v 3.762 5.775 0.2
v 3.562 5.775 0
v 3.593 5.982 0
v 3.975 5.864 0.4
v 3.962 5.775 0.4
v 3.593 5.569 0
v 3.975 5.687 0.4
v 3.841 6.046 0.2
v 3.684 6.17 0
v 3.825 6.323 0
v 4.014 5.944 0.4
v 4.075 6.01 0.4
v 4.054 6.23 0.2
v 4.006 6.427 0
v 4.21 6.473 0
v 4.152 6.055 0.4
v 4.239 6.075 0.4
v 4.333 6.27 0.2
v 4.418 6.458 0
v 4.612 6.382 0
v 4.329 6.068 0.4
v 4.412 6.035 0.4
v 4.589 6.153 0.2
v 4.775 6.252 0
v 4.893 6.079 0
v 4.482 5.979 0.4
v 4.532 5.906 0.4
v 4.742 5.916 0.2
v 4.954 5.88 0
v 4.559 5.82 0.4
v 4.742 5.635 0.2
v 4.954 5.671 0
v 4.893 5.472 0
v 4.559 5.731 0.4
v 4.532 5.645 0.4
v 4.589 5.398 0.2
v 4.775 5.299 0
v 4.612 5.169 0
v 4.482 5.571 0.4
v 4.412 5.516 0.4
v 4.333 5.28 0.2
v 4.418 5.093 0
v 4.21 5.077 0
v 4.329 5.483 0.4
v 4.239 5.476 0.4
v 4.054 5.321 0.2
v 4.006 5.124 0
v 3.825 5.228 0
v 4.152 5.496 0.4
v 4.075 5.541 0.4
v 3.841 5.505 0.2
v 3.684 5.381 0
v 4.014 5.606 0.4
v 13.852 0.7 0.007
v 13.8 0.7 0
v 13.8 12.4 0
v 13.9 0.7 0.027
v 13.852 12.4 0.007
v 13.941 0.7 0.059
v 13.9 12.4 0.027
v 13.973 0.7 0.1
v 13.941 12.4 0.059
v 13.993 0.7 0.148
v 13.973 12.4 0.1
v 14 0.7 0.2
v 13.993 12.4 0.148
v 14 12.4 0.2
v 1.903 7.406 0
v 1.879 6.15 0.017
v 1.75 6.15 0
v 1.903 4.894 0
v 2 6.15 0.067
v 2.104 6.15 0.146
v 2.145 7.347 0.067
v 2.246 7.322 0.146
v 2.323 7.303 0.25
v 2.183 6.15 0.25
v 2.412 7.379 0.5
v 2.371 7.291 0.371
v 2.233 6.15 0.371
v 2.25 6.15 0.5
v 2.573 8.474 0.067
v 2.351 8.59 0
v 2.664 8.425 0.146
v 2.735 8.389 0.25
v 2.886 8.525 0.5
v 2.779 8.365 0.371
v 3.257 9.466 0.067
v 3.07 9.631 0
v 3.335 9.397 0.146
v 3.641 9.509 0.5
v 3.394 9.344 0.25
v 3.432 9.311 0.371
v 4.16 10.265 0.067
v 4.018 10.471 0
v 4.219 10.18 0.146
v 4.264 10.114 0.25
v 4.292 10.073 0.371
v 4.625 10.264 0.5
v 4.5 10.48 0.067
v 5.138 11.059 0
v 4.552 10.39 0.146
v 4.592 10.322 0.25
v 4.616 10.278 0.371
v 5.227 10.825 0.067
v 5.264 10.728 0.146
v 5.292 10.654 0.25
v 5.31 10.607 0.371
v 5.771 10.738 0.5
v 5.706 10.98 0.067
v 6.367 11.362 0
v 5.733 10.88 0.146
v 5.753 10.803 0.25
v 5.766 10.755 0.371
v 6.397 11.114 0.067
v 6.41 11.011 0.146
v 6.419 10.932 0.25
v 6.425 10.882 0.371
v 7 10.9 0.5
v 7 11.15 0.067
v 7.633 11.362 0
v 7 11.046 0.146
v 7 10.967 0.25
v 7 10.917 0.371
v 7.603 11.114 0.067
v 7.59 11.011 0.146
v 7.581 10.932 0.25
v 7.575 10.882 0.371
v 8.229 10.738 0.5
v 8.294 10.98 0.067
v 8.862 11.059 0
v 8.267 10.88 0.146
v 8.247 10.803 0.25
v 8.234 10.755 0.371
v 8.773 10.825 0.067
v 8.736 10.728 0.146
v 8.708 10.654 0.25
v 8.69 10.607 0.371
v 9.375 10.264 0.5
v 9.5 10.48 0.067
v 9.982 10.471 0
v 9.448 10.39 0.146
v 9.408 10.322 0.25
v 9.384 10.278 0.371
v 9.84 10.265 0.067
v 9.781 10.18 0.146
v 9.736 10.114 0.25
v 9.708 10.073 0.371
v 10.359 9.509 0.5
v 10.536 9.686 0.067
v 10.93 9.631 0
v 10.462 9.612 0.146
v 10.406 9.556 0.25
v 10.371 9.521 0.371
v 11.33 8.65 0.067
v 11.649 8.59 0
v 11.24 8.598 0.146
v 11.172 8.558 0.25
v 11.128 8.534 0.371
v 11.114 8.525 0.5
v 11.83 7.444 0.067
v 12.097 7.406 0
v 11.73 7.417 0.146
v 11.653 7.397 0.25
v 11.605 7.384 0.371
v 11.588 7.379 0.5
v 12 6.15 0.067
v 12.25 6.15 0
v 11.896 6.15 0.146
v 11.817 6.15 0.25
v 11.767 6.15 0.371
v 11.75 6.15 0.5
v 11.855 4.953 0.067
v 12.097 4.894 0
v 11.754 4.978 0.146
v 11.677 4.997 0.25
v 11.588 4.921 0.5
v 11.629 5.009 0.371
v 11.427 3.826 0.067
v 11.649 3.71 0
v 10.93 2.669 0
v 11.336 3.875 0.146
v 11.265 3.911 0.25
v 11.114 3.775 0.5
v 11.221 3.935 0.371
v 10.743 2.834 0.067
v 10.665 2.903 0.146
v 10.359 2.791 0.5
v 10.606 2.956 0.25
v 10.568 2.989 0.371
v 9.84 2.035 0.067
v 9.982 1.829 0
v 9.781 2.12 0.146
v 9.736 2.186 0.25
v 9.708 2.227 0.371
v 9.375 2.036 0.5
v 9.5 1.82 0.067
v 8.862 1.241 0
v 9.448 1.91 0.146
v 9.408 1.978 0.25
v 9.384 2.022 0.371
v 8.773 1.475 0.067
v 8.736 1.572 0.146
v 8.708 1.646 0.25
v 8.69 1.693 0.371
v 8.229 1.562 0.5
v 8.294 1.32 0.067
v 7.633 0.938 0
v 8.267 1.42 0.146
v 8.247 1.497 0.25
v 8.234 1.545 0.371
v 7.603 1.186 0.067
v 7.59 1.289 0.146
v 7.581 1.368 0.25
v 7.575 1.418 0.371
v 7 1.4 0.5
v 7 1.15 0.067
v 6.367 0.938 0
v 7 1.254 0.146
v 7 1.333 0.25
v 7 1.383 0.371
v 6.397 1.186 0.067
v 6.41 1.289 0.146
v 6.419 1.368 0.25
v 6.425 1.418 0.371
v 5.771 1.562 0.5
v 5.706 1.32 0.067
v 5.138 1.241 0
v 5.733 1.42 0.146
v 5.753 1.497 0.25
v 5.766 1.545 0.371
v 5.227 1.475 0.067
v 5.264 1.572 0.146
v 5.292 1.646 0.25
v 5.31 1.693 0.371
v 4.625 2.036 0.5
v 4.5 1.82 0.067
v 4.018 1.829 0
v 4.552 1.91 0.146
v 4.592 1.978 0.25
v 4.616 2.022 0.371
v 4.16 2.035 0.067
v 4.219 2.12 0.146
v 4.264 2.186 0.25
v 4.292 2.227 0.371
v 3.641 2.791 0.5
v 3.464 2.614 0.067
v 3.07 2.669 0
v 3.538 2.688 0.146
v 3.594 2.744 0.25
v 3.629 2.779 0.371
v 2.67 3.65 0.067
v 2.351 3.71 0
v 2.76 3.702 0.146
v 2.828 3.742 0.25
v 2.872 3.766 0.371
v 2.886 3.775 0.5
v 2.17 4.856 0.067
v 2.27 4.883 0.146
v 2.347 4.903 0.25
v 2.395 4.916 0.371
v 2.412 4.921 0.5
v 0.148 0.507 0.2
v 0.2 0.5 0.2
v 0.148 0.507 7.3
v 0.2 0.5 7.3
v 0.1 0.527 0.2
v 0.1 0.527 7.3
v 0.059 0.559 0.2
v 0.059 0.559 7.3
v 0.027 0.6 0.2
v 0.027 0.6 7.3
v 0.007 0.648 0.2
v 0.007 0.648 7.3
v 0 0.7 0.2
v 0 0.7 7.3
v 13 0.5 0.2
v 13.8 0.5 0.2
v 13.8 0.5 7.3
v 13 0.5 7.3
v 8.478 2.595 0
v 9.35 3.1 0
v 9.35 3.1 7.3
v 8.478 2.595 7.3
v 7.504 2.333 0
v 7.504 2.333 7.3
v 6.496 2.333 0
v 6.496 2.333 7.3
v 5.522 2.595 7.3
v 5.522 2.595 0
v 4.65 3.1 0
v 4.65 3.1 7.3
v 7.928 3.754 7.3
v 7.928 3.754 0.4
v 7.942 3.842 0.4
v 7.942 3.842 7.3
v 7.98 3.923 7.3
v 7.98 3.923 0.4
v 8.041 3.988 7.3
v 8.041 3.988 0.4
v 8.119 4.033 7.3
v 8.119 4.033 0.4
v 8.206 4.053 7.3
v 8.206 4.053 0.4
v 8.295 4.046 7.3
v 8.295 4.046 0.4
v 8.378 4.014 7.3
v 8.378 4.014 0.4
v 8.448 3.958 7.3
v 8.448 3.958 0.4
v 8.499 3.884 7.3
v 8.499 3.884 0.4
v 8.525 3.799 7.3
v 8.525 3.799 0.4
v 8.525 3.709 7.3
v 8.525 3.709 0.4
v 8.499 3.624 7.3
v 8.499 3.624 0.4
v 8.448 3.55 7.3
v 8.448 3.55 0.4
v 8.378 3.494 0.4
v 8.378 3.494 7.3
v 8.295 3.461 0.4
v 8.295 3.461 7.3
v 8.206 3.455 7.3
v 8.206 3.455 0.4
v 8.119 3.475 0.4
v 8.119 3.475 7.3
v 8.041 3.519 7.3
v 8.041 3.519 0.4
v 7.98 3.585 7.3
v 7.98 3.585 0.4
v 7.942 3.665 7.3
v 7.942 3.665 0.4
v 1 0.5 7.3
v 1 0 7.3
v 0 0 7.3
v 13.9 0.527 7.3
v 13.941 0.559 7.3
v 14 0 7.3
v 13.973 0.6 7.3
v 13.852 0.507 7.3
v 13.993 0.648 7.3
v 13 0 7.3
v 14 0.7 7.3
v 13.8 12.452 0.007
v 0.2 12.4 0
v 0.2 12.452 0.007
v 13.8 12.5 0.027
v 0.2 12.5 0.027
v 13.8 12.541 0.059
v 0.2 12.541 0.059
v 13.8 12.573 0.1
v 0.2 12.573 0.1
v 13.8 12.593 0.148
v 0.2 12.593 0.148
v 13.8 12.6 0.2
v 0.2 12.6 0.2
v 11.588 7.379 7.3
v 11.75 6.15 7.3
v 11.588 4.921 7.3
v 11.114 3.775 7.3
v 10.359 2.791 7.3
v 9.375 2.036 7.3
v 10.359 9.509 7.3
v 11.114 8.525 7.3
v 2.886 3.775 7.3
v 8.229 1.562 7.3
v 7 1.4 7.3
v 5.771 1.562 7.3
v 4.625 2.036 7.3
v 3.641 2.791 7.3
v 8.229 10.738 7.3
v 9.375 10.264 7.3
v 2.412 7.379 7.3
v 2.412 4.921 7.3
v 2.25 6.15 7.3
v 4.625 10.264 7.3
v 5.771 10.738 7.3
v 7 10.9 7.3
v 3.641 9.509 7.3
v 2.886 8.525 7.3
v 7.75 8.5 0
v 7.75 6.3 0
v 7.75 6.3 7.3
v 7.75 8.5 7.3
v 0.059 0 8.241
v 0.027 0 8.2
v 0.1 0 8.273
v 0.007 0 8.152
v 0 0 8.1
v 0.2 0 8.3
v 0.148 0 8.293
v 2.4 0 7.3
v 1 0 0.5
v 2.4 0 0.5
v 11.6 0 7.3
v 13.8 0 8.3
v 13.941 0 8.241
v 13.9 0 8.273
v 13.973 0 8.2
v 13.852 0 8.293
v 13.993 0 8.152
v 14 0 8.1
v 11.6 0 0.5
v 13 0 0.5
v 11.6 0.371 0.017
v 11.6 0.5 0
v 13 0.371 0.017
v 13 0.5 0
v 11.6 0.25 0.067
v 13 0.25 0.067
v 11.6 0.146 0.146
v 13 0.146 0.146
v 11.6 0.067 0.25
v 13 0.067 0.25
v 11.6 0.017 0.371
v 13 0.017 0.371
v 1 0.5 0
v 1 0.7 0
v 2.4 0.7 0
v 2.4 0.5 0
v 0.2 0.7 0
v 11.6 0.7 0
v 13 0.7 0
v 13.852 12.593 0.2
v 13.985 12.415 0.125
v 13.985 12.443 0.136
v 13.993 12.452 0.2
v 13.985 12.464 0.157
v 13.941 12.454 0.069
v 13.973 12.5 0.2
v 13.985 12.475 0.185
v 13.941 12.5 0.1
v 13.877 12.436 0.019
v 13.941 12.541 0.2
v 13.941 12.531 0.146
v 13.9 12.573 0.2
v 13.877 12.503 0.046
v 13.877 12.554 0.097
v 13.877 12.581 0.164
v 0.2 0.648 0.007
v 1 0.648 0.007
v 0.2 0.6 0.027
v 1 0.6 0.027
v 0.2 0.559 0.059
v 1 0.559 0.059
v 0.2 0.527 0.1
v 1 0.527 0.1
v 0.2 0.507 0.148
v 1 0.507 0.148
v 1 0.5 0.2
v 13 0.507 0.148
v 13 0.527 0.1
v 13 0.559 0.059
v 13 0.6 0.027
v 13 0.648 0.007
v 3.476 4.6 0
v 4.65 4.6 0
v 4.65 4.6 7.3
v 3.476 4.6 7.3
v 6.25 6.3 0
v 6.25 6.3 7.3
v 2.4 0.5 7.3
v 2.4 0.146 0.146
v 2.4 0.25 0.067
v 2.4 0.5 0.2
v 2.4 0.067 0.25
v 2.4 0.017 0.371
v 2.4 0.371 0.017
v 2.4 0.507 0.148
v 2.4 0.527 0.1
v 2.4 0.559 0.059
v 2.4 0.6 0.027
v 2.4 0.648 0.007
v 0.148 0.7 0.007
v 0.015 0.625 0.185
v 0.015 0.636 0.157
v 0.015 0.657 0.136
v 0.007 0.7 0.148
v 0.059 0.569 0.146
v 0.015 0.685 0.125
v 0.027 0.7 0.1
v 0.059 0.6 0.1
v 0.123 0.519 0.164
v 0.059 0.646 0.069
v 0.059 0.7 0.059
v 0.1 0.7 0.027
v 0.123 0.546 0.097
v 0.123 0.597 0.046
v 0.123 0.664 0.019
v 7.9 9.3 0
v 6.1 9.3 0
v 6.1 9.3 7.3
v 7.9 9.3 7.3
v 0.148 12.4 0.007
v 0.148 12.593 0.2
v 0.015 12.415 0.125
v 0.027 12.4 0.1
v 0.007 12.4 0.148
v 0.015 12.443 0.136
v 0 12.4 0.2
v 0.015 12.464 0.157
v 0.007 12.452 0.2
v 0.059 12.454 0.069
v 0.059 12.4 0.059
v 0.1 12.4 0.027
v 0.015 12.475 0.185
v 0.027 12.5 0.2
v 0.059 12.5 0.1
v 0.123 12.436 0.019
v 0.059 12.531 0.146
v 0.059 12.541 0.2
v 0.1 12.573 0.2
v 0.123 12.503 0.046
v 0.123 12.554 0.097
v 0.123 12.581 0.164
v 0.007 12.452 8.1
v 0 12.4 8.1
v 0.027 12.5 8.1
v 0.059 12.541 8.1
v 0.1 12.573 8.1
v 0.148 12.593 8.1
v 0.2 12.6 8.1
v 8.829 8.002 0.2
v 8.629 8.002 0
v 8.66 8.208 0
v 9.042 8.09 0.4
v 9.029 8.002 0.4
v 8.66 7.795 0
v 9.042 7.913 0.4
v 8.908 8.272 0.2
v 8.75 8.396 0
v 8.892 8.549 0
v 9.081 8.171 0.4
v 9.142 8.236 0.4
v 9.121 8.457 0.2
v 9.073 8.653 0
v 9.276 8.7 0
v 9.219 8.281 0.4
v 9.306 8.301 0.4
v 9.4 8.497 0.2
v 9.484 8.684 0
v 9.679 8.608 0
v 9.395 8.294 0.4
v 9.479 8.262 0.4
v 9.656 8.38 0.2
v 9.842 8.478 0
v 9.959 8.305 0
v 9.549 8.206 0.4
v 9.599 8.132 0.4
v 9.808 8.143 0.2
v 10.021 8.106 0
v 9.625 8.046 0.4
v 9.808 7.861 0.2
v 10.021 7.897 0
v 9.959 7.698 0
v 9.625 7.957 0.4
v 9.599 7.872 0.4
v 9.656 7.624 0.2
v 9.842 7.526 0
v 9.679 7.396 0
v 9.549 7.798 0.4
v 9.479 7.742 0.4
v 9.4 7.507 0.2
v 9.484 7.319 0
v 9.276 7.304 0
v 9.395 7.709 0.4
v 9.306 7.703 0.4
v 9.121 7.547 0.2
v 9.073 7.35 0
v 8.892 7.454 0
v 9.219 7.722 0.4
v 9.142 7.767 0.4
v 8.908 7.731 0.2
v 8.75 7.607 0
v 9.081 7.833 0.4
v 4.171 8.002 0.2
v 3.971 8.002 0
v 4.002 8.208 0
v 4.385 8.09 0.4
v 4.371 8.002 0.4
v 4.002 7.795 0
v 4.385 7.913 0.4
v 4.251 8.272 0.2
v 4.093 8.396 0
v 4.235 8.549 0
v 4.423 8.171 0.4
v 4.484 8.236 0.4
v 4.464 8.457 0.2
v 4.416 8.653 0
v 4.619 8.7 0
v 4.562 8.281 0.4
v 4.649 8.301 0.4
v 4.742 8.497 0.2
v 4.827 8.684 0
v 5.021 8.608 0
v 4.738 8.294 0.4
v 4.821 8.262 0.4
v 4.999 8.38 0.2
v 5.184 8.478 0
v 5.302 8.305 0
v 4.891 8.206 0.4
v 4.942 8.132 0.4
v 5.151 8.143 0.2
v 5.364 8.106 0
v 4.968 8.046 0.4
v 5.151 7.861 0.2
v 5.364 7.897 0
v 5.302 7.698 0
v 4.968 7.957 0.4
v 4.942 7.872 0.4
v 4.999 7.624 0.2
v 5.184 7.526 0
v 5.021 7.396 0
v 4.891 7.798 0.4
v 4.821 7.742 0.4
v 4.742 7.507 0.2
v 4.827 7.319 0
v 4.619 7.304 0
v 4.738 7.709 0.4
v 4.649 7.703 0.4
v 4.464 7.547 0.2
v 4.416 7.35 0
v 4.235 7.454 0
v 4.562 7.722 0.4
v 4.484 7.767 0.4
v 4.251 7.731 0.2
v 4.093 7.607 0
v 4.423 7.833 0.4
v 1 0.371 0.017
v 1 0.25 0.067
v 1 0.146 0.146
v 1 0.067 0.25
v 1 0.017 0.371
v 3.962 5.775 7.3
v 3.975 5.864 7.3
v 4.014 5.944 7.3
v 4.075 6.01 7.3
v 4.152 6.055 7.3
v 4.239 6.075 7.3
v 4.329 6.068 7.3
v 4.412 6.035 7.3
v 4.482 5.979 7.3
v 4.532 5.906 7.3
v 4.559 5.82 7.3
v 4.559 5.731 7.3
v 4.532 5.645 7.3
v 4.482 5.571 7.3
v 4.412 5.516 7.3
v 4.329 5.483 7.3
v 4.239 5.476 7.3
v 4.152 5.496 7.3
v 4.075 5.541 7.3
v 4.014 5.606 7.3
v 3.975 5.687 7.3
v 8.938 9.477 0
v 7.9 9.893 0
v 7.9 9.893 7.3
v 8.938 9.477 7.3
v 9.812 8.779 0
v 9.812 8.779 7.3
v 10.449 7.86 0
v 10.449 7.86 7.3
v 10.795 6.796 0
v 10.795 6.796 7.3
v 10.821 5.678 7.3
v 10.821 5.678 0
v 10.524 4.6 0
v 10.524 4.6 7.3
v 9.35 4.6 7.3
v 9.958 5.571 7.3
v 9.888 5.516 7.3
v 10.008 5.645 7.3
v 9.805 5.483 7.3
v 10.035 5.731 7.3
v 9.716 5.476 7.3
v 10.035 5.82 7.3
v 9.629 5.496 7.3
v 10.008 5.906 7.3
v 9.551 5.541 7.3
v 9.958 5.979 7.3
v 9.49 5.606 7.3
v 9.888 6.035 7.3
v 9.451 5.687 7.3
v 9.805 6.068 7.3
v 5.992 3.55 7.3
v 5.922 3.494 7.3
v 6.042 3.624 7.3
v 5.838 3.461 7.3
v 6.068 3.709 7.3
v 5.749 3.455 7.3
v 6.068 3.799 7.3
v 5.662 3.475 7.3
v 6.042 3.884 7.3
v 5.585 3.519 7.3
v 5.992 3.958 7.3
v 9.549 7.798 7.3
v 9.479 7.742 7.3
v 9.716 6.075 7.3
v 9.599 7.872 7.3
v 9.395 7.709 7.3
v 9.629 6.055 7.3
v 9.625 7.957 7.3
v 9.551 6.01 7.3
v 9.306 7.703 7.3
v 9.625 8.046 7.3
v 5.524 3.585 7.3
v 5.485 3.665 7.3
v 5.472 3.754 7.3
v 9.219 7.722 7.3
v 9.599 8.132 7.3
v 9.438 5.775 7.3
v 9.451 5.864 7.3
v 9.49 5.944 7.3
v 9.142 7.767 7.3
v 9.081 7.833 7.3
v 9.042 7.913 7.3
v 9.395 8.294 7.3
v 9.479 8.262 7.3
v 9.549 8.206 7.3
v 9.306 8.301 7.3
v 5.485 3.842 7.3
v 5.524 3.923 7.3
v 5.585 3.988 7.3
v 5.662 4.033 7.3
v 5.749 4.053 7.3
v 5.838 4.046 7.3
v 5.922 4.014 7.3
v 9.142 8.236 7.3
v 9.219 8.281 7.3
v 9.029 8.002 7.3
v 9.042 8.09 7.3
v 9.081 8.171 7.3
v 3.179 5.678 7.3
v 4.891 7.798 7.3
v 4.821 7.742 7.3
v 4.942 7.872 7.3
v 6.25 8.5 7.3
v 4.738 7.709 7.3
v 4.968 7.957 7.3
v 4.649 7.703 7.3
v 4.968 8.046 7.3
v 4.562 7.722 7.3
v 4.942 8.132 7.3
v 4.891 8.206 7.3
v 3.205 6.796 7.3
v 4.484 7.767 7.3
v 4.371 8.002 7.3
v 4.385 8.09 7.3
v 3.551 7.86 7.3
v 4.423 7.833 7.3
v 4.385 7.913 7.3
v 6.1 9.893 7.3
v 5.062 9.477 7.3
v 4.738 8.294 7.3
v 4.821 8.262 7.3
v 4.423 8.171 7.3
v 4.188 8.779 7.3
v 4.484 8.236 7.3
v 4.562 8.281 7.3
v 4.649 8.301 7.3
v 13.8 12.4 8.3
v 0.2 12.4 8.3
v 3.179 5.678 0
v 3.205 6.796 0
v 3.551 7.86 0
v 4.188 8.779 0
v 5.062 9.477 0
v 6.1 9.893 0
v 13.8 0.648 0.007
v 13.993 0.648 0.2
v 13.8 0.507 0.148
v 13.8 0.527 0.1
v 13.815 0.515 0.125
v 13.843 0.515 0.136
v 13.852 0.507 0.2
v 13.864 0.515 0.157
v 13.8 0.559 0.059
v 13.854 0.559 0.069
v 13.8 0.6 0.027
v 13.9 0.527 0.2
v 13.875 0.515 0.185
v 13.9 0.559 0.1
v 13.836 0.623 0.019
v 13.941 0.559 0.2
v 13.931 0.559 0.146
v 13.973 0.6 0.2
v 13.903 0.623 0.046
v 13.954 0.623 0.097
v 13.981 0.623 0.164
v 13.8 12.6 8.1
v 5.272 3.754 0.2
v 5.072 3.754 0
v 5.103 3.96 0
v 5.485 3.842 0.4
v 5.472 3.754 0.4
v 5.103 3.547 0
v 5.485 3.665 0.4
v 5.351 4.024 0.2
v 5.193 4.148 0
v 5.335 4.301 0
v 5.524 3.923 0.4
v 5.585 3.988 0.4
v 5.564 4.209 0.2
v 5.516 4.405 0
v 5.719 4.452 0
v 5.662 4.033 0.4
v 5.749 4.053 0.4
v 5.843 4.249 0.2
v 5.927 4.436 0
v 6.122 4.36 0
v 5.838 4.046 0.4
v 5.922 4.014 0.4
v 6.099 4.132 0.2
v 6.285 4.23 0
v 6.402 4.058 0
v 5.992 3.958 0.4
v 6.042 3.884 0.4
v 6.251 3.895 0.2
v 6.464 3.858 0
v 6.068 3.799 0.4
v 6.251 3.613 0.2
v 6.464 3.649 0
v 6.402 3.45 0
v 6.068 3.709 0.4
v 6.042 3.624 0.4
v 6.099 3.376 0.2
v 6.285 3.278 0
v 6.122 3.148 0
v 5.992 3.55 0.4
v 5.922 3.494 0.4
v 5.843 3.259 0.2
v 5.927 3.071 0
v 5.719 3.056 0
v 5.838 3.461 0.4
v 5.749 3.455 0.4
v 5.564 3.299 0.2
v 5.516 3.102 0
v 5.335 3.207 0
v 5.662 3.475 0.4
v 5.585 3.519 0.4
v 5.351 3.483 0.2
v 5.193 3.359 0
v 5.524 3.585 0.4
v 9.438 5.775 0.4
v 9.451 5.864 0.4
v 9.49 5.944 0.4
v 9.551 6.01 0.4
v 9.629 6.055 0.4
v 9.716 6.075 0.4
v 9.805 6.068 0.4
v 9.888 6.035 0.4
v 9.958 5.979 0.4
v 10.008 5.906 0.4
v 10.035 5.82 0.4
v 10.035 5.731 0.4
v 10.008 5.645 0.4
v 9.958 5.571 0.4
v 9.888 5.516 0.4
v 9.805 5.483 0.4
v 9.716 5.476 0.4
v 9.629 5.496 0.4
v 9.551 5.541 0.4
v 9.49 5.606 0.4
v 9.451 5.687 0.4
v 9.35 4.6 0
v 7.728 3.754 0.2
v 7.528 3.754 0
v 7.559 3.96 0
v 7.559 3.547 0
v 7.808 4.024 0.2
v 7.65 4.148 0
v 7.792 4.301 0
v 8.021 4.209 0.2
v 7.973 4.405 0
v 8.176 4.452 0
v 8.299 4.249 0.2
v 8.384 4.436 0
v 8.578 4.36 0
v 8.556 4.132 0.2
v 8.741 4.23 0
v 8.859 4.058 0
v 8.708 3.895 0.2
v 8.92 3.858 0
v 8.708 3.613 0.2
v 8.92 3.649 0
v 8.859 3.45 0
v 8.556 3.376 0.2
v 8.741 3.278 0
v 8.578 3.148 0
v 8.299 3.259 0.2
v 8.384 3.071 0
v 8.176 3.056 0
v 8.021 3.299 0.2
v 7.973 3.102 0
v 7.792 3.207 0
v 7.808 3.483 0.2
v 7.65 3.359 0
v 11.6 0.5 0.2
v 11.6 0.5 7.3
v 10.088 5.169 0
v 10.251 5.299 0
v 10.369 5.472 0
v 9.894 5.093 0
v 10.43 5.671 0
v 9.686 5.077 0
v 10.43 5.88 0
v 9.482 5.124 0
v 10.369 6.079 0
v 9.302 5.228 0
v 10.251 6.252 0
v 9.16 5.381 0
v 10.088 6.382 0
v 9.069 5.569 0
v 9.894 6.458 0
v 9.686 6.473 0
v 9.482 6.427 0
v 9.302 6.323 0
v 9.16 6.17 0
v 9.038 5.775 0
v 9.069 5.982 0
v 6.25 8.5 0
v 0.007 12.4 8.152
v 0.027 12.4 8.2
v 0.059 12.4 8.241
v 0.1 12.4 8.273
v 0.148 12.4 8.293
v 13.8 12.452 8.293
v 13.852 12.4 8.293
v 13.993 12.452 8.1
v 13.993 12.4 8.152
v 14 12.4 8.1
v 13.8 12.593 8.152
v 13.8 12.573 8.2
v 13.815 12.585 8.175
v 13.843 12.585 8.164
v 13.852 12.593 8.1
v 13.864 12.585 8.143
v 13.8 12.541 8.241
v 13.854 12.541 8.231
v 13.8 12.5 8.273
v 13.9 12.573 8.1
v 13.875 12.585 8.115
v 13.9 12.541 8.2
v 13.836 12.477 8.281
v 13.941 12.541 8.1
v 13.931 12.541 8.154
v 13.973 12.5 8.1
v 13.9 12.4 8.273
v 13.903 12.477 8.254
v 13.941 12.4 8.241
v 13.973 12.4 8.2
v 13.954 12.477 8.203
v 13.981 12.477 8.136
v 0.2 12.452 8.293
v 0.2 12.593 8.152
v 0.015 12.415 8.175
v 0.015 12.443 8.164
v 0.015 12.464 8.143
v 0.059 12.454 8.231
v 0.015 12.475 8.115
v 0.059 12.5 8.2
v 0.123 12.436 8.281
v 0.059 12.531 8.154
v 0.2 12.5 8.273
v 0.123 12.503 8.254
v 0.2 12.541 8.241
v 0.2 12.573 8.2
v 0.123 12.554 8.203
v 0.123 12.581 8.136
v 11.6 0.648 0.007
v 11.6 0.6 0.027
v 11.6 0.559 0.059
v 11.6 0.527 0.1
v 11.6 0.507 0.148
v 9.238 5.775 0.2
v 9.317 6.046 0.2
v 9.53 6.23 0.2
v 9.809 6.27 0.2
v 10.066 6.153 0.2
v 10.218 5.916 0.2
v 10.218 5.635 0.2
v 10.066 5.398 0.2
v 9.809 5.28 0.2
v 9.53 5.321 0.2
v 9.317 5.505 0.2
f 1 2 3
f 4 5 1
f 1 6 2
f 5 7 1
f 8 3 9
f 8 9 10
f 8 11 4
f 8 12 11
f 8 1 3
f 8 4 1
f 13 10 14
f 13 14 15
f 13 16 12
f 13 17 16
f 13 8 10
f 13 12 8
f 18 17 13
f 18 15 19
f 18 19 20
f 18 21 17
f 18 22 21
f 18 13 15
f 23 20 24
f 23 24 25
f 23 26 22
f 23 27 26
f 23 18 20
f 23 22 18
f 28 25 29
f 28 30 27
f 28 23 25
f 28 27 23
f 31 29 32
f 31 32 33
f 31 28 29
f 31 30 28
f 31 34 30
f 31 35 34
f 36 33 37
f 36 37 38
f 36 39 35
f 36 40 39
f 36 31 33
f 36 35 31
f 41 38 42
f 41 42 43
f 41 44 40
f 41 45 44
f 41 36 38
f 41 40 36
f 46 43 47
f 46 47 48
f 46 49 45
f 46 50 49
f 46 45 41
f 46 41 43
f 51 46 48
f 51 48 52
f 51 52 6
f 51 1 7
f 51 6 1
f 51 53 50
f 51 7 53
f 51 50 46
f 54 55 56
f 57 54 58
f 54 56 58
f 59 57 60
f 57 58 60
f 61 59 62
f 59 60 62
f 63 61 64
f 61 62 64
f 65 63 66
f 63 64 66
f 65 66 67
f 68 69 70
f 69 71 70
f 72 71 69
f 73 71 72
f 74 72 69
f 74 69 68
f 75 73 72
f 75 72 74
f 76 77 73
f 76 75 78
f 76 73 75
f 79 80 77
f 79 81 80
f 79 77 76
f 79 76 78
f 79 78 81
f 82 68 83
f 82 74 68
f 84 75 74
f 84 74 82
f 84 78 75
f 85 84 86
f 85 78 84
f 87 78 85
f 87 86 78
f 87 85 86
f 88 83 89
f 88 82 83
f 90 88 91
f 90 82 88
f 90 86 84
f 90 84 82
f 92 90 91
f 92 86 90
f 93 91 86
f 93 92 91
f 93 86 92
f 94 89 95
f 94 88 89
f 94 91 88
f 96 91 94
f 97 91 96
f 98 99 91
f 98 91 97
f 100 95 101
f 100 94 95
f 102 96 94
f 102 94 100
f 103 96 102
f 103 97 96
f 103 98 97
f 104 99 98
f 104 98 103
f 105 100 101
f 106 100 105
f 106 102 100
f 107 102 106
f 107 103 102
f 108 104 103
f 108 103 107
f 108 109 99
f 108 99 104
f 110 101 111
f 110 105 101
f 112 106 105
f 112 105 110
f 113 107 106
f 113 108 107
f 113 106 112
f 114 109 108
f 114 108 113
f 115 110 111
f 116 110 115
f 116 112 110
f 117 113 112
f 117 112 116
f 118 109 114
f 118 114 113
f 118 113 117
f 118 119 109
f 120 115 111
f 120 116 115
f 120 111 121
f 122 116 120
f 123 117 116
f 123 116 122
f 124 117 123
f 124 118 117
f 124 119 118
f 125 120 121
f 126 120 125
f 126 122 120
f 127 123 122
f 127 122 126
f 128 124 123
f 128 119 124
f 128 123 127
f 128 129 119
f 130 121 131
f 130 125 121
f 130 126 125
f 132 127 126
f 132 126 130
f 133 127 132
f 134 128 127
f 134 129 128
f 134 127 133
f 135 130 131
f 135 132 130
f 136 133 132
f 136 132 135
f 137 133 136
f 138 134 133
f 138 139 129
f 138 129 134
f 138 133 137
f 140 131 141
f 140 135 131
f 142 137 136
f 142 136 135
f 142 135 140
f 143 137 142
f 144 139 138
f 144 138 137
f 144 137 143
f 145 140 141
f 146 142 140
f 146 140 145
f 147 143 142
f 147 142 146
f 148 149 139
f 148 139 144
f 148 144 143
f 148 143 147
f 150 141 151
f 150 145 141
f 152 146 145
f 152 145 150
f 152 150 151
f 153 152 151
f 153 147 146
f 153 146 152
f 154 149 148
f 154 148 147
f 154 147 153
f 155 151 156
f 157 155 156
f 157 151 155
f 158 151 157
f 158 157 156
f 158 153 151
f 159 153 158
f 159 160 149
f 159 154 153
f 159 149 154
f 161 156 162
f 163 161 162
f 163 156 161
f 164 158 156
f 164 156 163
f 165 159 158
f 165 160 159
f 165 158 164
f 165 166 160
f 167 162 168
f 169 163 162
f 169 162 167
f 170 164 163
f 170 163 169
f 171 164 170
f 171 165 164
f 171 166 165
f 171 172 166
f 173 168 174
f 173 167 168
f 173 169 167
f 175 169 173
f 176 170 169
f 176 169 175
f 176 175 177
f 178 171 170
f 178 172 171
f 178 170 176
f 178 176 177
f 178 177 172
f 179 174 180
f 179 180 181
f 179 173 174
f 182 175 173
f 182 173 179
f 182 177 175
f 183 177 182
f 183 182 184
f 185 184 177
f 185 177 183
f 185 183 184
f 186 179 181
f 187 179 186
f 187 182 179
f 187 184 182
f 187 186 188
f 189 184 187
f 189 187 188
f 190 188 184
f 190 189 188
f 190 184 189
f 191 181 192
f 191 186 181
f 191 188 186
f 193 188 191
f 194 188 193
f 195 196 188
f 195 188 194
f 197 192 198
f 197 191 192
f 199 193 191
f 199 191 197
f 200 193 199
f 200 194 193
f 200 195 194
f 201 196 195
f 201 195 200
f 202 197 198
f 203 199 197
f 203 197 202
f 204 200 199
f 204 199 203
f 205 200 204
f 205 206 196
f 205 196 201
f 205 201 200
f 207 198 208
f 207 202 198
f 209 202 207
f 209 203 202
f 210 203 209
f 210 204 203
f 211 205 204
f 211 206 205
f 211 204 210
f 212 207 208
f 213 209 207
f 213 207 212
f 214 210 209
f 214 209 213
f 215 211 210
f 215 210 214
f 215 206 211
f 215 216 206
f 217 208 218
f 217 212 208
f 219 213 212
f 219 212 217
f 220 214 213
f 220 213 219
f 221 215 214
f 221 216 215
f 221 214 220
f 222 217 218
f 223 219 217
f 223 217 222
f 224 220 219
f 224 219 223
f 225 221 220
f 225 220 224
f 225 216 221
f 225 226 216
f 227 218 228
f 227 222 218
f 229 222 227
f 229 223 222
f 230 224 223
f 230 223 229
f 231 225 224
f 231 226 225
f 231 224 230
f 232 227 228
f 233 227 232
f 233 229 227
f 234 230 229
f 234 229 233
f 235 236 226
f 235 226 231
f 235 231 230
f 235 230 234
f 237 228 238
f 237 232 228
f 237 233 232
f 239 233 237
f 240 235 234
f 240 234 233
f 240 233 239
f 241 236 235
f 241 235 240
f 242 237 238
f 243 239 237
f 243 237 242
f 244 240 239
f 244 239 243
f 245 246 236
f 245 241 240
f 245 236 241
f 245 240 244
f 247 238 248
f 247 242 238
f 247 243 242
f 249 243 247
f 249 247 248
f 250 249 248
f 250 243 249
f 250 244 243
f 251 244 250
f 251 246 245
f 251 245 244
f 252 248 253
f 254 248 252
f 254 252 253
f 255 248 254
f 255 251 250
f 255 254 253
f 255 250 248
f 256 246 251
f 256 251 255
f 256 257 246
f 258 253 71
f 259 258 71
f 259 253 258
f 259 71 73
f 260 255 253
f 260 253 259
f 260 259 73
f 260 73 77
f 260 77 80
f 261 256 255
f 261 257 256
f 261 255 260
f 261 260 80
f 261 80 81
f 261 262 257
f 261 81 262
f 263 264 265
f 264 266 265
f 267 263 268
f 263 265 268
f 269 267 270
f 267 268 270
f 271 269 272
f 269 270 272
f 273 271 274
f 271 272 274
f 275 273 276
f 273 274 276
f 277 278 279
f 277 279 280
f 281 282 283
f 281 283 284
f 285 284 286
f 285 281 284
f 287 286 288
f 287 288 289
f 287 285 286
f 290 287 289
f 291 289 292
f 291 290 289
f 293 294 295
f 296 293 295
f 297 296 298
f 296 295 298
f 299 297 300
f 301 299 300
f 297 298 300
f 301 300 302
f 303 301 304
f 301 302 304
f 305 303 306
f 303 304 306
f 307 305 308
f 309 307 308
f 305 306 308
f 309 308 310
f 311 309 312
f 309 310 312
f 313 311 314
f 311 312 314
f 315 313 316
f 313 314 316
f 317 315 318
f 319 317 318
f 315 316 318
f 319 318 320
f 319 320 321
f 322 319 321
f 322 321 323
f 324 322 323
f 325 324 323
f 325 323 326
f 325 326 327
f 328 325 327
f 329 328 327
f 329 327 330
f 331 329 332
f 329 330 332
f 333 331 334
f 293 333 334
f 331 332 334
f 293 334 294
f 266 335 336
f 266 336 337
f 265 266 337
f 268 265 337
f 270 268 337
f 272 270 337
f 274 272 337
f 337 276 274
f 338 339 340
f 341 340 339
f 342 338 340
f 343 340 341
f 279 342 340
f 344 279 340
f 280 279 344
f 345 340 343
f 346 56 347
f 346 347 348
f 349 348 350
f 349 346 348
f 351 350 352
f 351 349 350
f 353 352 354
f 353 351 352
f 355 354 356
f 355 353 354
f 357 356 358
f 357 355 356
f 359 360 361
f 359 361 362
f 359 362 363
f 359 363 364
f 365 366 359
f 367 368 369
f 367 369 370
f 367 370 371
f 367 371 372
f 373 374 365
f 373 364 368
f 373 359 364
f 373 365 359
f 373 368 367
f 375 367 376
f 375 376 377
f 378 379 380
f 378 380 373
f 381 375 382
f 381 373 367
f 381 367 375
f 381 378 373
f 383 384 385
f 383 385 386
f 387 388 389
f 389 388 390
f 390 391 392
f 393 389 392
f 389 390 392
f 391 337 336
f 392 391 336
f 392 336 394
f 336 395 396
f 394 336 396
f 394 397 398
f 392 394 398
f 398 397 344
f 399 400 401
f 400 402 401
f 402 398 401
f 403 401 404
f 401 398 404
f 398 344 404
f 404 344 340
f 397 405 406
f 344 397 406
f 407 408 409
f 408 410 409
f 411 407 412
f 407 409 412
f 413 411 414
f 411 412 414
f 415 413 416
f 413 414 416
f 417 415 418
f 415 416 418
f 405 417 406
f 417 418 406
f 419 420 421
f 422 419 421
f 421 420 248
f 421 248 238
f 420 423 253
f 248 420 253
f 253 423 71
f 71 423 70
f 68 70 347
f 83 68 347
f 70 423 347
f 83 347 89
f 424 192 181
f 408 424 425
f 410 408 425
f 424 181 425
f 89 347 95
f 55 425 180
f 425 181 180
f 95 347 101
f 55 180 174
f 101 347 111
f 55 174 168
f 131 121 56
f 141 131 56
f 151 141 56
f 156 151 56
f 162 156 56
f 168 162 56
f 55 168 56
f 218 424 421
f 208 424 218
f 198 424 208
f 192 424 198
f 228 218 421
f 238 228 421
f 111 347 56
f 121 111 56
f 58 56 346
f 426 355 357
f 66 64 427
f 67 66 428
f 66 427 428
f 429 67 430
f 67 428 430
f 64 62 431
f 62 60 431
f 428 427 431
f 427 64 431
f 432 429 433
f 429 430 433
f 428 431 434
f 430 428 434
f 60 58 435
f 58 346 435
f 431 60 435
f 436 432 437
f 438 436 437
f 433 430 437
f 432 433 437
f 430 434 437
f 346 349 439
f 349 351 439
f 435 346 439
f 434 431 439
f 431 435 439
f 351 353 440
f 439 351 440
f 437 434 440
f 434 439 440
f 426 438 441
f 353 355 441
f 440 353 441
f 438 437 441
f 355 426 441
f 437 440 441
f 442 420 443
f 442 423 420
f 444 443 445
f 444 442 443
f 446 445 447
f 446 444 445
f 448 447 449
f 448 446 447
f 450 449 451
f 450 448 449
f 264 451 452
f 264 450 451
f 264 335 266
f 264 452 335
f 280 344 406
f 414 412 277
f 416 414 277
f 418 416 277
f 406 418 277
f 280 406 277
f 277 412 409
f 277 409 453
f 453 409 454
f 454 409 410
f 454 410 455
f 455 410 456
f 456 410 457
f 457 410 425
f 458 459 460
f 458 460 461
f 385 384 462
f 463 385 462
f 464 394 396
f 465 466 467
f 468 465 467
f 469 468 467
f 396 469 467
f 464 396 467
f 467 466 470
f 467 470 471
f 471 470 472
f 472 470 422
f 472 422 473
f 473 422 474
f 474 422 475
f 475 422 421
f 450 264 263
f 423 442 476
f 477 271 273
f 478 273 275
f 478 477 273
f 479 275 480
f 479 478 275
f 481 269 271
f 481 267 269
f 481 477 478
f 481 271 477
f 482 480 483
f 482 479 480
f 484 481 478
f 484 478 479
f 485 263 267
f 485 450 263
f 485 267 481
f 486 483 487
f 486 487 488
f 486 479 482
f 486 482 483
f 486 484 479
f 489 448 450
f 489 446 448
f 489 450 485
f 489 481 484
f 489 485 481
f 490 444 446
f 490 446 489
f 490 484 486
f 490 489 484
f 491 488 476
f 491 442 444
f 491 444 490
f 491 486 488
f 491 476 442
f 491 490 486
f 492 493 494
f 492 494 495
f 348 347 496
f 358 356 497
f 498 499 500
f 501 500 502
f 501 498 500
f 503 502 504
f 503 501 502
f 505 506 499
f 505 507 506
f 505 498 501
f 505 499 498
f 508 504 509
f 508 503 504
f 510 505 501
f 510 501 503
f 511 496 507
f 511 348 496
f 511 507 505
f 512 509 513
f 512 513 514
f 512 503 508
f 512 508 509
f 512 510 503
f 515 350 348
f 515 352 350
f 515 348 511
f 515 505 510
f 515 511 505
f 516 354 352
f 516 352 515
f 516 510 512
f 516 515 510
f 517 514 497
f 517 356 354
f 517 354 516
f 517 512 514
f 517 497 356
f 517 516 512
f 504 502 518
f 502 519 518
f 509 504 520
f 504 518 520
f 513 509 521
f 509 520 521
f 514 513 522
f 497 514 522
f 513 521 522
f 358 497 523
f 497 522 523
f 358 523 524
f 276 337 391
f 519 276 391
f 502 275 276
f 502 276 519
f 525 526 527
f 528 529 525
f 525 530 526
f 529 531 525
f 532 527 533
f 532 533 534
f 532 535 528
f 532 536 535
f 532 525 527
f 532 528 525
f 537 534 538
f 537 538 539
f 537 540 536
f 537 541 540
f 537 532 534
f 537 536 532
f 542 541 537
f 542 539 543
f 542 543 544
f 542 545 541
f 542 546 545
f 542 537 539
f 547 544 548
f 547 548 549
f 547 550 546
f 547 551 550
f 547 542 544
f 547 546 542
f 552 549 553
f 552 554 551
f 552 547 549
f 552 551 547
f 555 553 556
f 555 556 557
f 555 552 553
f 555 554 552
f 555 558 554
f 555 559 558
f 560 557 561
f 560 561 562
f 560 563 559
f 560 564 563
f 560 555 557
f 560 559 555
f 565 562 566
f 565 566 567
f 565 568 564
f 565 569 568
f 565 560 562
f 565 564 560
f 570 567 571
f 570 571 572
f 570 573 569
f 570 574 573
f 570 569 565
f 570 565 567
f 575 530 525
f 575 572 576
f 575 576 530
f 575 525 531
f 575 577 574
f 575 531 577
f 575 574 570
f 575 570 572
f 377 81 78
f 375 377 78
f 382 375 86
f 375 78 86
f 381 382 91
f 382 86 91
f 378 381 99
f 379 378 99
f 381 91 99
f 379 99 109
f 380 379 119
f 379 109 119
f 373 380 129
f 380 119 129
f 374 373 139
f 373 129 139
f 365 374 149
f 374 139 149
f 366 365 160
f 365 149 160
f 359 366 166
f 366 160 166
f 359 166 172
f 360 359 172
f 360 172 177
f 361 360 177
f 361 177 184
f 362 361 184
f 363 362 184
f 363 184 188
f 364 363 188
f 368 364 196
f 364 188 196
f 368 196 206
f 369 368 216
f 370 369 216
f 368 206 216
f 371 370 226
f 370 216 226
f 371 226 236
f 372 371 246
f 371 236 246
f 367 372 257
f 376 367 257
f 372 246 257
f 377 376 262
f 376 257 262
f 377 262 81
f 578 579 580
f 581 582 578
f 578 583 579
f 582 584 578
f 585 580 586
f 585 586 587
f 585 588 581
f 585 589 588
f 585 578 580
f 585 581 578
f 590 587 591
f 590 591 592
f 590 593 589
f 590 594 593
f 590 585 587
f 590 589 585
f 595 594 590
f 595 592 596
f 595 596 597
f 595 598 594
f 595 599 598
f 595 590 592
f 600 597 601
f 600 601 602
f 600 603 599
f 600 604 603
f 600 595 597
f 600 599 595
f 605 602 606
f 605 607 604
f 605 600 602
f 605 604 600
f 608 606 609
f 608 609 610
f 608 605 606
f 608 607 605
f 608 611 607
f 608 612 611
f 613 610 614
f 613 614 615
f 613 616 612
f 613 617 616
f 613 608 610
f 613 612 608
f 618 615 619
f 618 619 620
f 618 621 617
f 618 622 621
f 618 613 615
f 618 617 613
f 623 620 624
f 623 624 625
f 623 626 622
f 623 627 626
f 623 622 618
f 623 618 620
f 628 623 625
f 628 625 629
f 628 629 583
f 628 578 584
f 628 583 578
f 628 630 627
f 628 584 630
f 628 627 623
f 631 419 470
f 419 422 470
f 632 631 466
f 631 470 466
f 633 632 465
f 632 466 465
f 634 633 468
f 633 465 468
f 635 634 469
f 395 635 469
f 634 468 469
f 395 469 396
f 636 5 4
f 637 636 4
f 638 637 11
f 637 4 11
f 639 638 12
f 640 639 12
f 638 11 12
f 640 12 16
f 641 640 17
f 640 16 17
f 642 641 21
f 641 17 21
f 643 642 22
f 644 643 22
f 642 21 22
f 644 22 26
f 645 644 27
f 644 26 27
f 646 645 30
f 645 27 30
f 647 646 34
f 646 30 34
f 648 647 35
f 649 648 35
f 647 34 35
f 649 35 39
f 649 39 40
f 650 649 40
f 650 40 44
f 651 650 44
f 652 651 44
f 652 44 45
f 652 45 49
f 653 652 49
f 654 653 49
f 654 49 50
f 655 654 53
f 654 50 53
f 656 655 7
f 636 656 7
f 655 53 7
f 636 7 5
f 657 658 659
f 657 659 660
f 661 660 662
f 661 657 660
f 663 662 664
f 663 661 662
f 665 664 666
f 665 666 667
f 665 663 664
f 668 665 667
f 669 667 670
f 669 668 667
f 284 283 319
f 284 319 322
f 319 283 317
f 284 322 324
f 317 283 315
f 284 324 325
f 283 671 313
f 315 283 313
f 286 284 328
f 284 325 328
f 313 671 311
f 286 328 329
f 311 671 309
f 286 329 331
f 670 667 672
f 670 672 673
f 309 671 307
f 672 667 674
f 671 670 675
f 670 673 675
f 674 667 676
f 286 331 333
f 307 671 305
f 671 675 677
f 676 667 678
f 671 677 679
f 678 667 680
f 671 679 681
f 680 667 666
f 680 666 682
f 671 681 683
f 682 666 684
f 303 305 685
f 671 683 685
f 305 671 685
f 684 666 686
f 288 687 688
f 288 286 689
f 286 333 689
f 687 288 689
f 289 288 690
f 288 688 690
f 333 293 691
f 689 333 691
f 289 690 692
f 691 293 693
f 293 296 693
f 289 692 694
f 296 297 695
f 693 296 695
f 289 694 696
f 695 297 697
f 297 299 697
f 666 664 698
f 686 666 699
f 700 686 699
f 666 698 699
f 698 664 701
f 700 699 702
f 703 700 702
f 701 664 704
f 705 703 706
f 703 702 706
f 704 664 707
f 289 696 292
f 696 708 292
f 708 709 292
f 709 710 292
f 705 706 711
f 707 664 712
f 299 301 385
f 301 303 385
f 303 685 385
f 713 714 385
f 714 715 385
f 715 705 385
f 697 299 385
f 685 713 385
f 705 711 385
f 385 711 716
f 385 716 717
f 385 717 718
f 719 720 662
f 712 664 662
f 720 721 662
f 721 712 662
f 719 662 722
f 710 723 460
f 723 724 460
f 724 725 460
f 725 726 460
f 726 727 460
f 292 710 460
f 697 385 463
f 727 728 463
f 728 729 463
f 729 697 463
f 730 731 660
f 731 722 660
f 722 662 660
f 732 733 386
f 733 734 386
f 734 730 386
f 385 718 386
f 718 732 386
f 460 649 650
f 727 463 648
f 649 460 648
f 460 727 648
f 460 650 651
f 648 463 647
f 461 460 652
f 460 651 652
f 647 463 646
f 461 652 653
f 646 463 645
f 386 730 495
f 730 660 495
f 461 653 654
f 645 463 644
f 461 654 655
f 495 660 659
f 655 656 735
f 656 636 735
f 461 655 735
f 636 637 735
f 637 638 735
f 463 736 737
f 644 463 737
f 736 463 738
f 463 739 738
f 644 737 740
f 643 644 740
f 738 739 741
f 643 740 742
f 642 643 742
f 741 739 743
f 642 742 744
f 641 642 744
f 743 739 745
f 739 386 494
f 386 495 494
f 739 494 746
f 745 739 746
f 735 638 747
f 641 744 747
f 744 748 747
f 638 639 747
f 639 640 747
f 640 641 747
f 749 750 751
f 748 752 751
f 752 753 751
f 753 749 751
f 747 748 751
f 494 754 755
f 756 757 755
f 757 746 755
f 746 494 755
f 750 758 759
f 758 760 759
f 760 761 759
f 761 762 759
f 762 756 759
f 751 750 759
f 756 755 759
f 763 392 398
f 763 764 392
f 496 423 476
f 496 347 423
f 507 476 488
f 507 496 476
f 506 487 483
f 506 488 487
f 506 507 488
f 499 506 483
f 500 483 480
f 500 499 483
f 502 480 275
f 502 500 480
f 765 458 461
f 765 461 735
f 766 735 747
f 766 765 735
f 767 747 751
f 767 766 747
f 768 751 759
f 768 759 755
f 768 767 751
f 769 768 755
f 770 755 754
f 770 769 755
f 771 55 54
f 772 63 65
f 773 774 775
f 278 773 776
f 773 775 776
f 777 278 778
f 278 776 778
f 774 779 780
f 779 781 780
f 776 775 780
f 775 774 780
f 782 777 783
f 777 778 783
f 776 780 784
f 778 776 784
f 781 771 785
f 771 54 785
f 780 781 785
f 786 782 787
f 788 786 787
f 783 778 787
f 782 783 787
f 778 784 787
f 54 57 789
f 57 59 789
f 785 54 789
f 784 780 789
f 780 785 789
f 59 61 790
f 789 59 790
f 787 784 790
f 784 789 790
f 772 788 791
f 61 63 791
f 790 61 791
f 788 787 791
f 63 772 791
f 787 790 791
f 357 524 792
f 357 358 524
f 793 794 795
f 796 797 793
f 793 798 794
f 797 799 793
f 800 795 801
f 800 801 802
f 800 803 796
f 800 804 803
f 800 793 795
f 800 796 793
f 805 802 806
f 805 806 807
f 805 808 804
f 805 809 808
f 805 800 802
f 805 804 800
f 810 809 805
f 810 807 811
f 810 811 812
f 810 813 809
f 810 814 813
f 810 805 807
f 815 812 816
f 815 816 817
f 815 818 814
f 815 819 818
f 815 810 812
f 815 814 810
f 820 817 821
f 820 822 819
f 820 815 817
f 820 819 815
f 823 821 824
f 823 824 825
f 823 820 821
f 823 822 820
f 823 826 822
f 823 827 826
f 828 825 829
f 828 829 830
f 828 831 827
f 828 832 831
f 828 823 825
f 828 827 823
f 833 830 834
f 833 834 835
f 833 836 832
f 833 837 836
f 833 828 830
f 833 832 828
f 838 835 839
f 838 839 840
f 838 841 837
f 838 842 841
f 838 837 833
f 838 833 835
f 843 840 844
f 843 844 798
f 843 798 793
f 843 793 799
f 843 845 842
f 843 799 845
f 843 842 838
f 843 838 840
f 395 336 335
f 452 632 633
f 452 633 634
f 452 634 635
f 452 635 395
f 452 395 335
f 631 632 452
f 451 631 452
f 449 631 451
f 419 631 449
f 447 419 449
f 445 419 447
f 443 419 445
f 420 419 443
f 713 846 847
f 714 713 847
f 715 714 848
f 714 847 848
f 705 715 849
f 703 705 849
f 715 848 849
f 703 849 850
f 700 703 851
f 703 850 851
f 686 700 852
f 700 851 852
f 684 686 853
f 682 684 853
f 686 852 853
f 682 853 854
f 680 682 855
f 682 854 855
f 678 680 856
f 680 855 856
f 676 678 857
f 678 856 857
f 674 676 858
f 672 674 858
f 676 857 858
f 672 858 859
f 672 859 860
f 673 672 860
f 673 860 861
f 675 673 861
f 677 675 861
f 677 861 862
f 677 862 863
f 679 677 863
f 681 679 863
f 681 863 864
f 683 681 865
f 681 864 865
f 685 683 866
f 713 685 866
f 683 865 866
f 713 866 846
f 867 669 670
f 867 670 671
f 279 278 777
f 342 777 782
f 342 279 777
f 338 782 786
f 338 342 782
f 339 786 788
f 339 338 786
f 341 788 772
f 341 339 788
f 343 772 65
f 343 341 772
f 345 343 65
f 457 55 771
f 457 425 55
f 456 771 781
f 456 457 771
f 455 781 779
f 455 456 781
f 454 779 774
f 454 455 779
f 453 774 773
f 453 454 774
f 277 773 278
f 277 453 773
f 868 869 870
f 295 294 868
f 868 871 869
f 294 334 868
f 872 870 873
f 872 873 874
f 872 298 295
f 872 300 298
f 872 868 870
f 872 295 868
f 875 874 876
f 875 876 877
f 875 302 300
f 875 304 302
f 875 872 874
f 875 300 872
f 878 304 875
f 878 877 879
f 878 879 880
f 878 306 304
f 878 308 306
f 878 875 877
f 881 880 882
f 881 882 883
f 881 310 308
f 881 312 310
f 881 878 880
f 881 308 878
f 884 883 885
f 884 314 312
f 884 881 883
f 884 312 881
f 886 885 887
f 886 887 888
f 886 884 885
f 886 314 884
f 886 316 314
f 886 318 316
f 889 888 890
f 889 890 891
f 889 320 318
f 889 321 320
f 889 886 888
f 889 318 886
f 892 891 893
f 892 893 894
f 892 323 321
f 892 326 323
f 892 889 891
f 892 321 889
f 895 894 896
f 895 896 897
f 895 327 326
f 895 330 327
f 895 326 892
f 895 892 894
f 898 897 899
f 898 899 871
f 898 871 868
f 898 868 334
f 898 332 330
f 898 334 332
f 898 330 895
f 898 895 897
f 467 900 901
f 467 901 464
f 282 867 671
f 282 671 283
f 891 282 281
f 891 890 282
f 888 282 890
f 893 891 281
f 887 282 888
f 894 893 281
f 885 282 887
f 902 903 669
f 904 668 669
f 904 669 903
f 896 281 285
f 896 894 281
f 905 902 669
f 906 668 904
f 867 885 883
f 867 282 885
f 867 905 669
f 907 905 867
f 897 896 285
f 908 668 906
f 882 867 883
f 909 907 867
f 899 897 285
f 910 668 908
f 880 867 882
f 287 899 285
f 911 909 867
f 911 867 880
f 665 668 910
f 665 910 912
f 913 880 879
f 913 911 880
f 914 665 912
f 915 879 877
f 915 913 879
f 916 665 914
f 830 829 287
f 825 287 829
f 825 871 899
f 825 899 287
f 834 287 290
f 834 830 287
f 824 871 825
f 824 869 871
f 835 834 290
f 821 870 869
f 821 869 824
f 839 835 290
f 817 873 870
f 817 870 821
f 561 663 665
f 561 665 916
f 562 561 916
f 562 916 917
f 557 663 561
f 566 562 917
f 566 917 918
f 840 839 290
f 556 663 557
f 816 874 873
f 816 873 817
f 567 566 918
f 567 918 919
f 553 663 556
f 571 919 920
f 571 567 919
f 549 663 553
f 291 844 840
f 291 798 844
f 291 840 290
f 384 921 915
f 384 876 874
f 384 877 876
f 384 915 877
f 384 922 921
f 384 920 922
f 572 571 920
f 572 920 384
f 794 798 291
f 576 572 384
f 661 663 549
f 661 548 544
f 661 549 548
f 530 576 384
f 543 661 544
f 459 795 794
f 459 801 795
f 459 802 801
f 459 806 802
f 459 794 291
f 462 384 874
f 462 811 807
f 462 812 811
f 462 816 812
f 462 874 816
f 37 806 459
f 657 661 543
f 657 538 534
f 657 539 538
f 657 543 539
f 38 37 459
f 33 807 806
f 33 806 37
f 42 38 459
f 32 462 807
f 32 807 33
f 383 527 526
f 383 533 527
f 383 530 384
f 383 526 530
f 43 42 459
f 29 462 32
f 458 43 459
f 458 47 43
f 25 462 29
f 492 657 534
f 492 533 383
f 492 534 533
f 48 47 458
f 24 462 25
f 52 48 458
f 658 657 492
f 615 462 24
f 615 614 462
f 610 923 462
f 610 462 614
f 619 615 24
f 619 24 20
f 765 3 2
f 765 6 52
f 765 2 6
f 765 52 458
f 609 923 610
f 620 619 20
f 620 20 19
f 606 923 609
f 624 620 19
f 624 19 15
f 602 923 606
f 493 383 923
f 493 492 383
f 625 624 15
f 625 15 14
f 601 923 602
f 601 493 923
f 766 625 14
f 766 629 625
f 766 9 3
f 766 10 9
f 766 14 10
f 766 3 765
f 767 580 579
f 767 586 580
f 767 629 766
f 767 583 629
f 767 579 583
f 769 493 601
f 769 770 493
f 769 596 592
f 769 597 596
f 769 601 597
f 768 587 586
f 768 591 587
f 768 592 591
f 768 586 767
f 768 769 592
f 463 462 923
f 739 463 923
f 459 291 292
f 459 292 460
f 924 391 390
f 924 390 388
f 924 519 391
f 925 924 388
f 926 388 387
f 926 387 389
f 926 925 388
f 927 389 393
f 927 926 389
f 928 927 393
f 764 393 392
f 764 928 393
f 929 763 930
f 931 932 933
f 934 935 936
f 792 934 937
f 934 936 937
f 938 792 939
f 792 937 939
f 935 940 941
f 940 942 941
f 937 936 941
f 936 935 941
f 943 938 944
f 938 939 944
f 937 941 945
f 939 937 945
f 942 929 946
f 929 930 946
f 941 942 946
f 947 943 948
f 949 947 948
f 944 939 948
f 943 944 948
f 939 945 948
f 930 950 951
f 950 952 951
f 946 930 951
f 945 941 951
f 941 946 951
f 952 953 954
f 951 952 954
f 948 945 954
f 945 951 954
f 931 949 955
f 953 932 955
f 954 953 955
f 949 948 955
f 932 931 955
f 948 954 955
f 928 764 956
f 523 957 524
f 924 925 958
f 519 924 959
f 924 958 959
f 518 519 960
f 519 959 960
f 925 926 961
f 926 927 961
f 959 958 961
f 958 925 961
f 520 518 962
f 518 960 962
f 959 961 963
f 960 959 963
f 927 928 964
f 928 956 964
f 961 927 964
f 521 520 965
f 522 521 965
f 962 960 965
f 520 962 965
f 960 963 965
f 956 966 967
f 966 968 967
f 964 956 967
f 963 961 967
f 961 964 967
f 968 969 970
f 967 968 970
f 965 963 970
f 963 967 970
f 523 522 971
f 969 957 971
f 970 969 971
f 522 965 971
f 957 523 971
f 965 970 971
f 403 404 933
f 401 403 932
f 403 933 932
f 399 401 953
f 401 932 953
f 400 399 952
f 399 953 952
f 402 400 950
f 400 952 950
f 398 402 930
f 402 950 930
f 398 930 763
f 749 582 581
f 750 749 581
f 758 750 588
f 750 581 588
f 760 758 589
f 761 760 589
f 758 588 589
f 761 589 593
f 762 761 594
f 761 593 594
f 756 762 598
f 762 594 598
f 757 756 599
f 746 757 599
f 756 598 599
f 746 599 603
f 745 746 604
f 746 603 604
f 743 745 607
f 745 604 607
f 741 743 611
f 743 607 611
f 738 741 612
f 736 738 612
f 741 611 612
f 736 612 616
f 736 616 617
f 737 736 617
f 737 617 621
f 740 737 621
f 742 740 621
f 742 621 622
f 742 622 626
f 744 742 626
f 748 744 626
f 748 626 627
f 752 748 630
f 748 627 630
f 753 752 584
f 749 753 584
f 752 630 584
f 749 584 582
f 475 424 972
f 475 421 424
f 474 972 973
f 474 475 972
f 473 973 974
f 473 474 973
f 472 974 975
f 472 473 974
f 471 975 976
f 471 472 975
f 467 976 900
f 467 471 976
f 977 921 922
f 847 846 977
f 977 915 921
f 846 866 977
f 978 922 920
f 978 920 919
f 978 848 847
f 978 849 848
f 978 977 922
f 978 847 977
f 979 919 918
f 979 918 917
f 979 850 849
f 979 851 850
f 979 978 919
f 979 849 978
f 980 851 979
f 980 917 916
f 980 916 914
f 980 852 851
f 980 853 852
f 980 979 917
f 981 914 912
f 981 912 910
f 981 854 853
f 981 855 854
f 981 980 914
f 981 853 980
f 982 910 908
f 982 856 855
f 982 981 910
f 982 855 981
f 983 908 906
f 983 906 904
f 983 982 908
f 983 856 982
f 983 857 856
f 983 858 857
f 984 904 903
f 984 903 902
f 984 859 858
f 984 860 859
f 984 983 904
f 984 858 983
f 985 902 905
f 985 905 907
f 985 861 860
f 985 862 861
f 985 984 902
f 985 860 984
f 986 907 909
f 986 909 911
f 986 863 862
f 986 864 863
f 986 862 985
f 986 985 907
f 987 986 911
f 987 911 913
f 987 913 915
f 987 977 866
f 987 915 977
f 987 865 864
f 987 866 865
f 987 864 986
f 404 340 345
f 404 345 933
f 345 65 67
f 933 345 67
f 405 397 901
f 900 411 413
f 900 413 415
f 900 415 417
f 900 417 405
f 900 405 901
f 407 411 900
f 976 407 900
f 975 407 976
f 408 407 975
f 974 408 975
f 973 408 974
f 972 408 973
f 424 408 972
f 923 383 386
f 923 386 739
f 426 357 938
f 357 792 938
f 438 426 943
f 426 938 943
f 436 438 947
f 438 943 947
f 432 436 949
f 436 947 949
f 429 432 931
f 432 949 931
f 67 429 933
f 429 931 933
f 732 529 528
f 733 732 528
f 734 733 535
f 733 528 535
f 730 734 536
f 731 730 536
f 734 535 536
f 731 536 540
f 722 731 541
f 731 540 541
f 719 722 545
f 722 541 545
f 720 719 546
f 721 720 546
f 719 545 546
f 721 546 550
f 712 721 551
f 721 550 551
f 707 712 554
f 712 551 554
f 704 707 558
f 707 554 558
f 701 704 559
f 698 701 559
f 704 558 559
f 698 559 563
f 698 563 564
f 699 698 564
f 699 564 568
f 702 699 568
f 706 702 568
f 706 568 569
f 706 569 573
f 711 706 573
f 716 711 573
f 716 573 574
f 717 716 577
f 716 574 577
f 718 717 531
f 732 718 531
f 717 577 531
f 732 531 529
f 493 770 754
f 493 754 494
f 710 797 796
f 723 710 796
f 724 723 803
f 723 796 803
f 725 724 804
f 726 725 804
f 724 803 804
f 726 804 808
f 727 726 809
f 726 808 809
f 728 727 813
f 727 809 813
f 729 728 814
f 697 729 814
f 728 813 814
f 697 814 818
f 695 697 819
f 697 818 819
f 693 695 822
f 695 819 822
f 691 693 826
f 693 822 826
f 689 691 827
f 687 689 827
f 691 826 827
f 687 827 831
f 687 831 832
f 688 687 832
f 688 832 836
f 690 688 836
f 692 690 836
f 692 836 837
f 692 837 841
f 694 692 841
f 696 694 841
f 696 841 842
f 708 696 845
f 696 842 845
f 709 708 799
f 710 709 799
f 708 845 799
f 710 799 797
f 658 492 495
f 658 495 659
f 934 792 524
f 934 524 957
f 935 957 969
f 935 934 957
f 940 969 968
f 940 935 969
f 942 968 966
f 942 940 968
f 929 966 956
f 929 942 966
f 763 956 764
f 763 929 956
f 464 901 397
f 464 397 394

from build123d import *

# Parameters (mm, degrees)
CROQUIS1_W            = 14
CROQUIS1_H            = 12.6
EXTRUIR1_DEPTH        = 8.3
CROQUIS2_R            = 4.75
CORTAR_EXTRUIR1_DEPTH = 7.3
REDONDEO1_R           = 0.5
CROQUIS3_W            = 9.2
CROQUIS3_H            = 0.789398471
CROQUIS3_W_2          = 2.03522765
CROQUIS3_W_3          = 1.728148887
CROQUIS3_H_2          = 1.147657029
CORTAR_EXTRUIR2_DEPTH = 7.3
REDONDEO2_R           = 0.5
EXTRUIR2_DEPTH        = 7.3
CROQUIS5_W            = 1.5
CROQUIS5_H            = 2.2
CROQUIS5_R            = 0.3
CORTAR_EXTRUIR3_DEPTH = 7.3
CHAFL_N1_SIZE         = 0.4
REDONDEO3_R           = 0.2


with BuildPart() as part:
    # Croquis1 → Extruir1 (new body)
    with BuildSketch(Plane.XY):
        with Locations((7, 6.3)):
            Rectangle(CROQUIS1_W, CROQUIS1_H)
    extrude(amount=EXTRUIR1_DEPTH)

    # Croquis2 → Cortar-Extruir1 (cut)
    with BuildSketch(Plane(origin=(0, 0, 0), x_dir=(-1, 0, 0), z_dir=(0, 0, -1))):
        with Locations((-7, 6.15)):
            Circle(CROQUIS2_R)
    extrude(amount=-CORTAR_EXTRUIR1_DEPTH, mode=Mode.SUBTRACT)

    # Redondeo1
    redondeo1_edges = [part.edges().sort_by_distance(p)[0] for p in [
        (11.75, 6.15, 0),
    ]]
    fillet(redondeo1_edges, radius=REDONDEO1_R)

    # Croquis3 → Cortar-Extruir2 (cut)
    with BuildSketch(Plane(origin=(0, 0, 0), x_dir=(-1, 0, 0), z_dir=(0, 0, -1))):
        with Locations((-7, 0.105300765)):
            Rectangle(CROQUIS3_W, CROQUIS3_H)
        with Locations((0.017613825, 0.105300765)):
            Rectangle(CROQUIS3_W_2, CROQUIS3_H)
        with Locations((-13.864074444, -0.073828514)):
            Rectangle(CROQUIS3_W_3, CROQUIS3_H_2)
    extrude(amount=-CORTAR_EXTRUIR2_DEPTH, mode=Mode.SUBTRACT)

    # Redondeo2
    redondeo2_edges = [part.edges().sort_by_distance(p)[0] for p in [
        (1.7, 0, 0),
        (12.3, 0, 0),
    ]]
    fillet(redondeo2_edges, radius=REDONDEO2_R)

    # Redondeo3
    redondeo3_edges = [part.edges().sort_by_distance(p)[0] for p in [
        (14, 6.3, 8.3),
        (7, 12.6, 8.3),
        (0.5, 0.5, 0),
        (0, 0.5, 3.65),
        (0, 6.3, 8.3),
        (7, 0.5, 0),
        (7, 12.6, 0),
        (14, 6.55, 0),
        (0, 6.55, 0),
        (13.5, 0.5, 0),
        (14, 0.5, 3.65),
        (0, 12.6, 4.15),
        (14, 12.6, 4.15),
    ]]
    fillet(redondeo3_edges, radius=REDONDEO3_R)


with BuildPart() as body_2:
    # Croquis4 → Extruir2 (new body)
    with BuildSketch(Plane(origin=(0, 0, 0), x_dir=(-1, 0, 0), z_dir=(0, 0, -1))):
        with BuildLine():
            Line((-10.524202037, 4.6), (-9.35, 4.6))
            Line((-9.35, 4.6), (-9.35, 3.100409864))
            ThreePointArc((-9.35, 3.100409864), (-7, 2.3), (-4.65, 3.100409864))
            Line((-4.65, 3.100409864), (-4.65, 4.6))
            Line((-4.65, 4.6), (-3.475797963, 4.6))
            ThreePointArc((-3.475797963, 4.6), (-3.550620396, 7.860052733), (-6.1, 9.893327397))
            Line((-6.1, 9.893327397), (-6.1, 9.3))
            Line((-6.1, 9.3), (-7.9, 9.3))
            Line((-7.9, 9.3), (-7.9, 9.893327397))
            ThreePointArc((-7.9, 9.893327397), (-10.449379604, 7.860052733), (-10.524202037, 4.6))
        make_face()
    extrude(amount=-EXTRUIR2_DEPTH)

    # Croquis5 → Cortar-Extruir3 (cut)
    with BuildSketch(Plane(origin=(0, 0, 0), x_dir=(-1, 0, 0), z_dir=(0, 0, -1))):
        with Locations((-7, 7.4)):
            Rectangle(CROQUIS5_W, CROQUIS5_H)
        with Locations((-4.671319375, 8.001728149)):
            Circle(CROQUIS5_R)
        with Locations((-4.261881024, 5.775407112)):
            Circle(CROQUIS5_R)
        with Locations((-9.328680625, 8.001728149)):
            Circle(CROQUIS5_R)
        with Locations((-9.738118976, 5.775407112)):
            Circle(CROQUIS5_R)
        with Locations((-8.228315055, 3.753805251)):
            Circle(CROQUIS5_R)
        with Locations((-5.771684945, 3.753805251)):
            Circle(CROQUIS5_R)
    extrude(amount=-CORTAR_EXTRUIR3_DEPTH, mode=Mode.SUBTRACT)

    # Chaflán1
    chafl_n1_edges = [body_2.edges().sort_by_distance(p)[0] for p in [
        (4.971319375, 8.001728149, 0),
        (4.561881024, 5.775407112, 0),
        (9.628680625, 8.001728149, 0),
        (10.038118976, 5.775407112, 0),
        (8.528315055, 3.753805251, 0),
        (6.071684945, 3.753805251, 0),
    ]]
    chamfer(chafl_n1_edges, length=CHAFL_N1_SIZE)


solid = Compound([part.part, body_2.part])
